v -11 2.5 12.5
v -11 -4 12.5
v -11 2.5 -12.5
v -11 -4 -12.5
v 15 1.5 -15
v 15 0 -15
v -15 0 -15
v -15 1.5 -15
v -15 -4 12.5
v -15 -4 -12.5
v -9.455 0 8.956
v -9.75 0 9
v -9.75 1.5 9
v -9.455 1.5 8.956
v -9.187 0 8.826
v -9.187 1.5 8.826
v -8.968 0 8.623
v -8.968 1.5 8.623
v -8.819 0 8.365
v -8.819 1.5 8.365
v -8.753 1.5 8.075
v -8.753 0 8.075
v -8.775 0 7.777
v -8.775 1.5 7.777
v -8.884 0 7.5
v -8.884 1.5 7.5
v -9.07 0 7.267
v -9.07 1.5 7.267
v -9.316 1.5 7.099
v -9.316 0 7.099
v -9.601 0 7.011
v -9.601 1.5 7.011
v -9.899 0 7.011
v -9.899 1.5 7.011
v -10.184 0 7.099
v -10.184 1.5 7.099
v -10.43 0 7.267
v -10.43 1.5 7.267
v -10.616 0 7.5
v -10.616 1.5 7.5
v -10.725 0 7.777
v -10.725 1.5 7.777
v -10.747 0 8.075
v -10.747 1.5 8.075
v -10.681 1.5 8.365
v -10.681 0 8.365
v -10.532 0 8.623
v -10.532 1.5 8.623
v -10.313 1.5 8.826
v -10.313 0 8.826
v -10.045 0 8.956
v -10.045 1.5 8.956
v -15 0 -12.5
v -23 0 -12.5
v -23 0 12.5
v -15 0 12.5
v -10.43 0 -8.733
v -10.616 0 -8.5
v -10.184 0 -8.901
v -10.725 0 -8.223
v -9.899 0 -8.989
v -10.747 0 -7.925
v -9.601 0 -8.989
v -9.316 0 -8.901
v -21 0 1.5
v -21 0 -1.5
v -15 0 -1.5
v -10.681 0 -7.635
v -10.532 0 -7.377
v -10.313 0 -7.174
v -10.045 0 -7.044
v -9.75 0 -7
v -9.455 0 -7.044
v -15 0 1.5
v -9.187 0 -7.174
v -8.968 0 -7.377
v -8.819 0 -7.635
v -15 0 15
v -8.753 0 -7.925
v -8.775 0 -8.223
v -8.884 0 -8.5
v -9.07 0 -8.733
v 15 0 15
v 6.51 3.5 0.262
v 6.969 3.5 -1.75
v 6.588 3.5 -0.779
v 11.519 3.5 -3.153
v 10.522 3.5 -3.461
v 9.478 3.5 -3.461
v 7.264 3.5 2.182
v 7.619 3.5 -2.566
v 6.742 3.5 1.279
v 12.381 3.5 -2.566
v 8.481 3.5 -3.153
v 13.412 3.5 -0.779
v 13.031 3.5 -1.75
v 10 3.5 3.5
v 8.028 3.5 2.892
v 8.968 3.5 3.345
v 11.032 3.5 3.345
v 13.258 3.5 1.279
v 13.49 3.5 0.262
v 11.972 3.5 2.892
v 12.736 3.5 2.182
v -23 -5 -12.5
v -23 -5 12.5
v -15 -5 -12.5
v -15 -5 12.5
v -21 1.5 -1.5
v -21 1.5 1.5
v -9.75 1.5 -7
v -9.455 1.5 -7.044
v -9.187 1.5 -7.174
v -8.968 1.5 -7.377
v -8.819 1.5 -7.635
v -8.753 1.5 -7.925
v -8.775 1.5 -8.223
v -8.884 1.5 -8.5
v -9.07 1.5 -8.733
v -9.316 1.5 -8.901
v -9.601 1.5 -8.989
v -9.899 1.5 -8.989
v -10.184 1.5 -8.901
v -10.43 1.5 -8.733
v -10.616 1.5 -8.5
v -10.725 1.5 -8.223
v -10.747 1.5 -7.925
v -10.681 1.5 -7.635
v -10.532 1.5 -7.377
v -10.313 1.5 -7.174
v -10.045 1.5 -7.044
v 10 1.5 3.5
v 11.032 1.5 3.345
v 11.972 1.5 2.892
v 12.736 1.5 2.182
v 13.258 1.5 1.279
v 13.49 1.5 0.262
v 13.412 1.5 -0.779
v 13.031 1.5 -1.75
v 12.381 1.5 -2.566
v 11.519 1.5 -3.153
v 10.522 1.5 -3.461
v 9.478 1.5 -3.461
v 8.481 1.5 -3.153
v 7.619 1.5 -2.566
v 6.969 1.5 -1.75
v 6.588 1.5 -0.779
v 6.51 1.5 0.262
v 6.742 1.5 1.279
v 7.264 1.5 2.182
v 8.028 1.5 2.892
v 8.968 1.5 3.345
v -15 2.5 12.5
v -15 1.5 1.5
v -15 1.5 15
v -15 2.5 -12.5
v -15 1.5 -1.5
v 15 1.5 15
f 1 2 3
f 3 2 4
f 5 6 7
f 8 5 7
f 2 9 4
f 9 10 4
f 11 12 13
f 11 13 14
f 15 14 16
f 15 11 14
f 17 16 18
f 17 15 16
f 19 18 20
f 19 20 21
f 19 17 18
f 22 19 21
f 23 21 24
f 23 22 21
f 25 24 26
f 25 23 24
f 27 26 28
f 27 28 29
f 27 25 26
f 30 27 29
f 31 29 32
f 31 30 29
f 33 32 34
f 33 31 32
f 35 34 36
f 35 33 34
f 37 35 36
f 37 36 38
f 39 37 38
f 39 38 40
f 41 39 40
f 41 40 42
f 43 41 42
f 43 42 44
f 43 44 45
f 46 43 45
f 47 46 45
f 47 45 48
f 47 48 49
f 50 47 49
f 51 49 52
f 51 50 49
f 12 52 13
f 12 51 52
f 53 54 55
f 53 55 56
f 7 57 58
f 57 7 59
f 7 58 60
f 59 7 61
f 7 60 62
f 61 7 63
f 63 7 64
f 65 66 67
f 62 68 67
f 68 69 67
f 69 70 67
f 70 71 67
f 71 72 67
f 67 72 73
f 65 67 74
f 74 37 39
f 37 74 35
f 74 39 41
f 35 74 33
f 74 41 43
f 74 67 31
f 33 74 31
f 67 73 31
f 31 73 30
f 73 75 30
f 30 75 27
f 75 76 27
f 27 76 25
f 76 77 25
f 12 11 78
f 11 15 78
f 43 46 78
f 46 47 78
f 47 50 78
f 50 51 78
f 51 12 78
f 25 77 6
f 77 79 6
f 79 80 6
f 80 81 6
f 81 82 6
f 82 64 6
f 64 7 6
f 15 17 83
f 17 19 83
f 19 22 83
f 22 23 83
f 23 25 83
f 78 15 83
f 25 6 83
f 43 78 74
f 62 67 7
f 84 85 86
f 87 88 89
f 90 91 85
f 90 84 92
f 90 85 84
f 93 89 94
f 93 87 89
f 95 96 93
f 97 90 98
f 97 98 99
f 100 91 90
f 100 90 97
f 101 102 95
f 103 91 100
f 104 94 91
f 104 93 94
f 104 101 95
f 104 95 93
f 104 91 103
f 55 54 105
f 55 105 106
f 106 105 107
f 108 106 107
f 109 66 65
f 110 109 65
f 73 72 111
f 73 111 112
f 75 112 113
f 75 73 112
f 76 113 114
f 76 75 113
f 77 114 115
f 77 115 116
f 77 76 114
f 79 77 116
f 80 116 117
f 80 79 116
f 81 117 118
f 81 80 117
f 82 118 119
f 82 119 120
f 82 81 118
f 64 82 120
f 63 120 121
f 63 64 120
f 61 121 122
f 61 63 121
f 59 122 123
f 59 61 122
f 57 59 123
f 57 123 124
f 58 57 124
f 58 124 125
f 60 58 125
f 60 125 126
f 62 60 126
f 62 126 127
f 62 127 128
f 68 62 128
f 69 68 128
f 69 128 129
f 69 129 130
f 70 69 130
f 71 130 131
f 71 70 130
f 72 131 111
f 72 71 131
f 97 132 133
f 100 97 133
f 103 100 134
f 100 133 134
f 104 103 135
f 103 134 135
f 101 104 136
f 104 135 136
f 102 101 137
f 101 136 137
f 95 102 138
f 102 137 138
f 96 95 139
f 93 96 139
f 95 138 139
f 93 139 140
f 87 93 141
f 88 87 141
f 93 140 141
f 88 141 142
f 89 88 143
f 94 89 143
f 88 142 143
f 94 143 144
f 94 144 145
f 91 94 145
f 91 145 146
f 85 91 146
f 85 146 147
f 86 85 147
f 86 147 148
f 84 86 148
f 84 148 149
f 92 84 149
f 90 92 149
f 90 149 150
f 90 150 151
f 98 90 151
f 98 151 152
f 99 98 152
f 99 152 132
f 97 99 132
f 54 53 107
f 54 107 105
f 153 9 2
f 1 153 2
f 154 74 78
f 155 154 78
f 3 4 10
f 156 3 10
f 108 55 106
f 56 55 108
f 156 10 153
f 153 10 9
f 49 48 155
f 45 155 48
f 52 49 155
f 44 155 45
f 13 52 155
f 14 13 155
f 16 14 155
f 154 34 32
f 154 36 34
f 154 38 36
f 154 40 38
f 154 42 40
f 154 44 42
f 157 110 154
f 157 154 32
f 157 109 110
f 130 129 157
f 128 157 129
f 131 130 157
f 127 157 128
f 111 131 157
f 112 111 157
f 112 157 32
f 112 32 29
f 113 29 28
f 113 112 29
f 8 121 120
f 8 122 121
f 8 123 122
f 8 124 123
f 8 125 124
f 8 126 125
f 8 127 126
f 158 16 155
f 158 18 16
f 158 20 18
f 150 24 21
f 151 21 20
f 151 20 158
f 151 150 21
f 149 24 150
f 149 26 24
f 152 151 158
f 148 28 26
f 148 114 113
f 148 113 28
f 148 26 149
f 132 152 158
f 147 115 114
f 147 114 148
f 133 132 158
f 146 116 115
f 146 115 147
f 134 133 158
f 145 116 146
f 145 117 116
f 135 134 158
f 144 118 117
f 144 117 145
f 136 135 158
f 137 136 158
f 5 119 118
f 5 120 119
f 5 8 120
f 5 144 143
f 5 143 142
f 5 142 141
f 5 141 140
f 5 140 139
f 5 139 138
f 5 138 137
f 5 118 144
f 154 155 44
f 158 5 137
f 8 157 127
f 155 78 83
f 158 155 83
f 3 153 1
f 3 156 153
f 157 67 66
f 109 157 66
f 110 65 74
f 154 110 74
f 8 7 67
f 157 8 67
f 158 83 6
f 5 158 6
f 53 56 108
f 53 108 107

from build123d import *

# Parameters (mm, degrees)
SKETCH_1_R           = 1
EXTRUDE_1_DEPTH      = 1.5
SKETCH_1_3_W         = 8
SKETCH_1_3_H         = 25
EXTRUDE_2_DEPTH      = 5
EXTRUDE_3_DEPTH      = 2.5
EXTRUDE_3_DEPTH_BACK = 4
SKETCH_1_5_R         = 3.5
EXTRUDE_4_DEPTH      = 3.5


with BuildPart() as part:
    # Эскиз1 → Бобышка-Вытянуть1 (new body)
    with BuildSketch(Plane(origin=(0, 0, 0), x_dir=(1, 0, 0), z_dir=(0, 1, 0))):
        Polygon((-21, -1.5), (-15, -1.5), (-15, -15), (15, -15), (15, 15), (-15, 15), (-15, 1.5), (-21, 1.5), align=None)
        with Locations((-9.75, -8)):
            Circle(SKETCH_1_R, mode=Mode.SUBTRACT)
        with Locations((-9.75, 8)):
            Circle(SKETCH_1_R, mode=Mode.SUBTRACT)
    extrude(amount=EXTRUDE_1_DEPTH)

    # Эскиз1<5> → Бобышка-Вытянуть4 (add)
    with BuildSketch(Plane(origin=(0, 0, 0), x_dir=(1, 0, 0), z_dir=(0, 1, 0))):
        with Locations((10, 0)):
            Circle(SKETCH_1_5_R)
    extrude(amount=EXTRUDE_4_DEPTH)


with BuildPart() as body_2:
    # Эскиз1<3> → Бобышка-Вытянуть2 (new body)
    with BuildSketch(Plane(origin=(0, 0, 0), x_dir=(1, 0, 0), z_dir=(0, 1, 0))):
        with Locations((-19, 0)):
            Rectangle(SKETCH_1_3_W, SKETCH_1_3_H)
    extrude(amount=-EXTRUDE_2_DEPTH)


with BuildPart() as body_3:
    # Эскиз1<4> → Бобышка-Вытянуть3 (new, two sides: drawn at the far end of the back side and taken through both)
    with BuildSketch(Plane(origin=(0, 0, 0), x_dir=(1, 0, 0), z_dir=(0, 1, 0)).offset(-EXTRUDE_3_DEPTH_BACK)):
        Polygon((-15, 1.5), (-15, -1.5), (-15, -12.5), (-11, -12.5), (-11, 12.5), (-15, 12.5), align=None)
    extrude(amount=EXTRUDE_3_DEPTH + EXTRUDE_3_DEPTH_BACK)


solid = Compound([part.part, body_2.part, body_3.part])
